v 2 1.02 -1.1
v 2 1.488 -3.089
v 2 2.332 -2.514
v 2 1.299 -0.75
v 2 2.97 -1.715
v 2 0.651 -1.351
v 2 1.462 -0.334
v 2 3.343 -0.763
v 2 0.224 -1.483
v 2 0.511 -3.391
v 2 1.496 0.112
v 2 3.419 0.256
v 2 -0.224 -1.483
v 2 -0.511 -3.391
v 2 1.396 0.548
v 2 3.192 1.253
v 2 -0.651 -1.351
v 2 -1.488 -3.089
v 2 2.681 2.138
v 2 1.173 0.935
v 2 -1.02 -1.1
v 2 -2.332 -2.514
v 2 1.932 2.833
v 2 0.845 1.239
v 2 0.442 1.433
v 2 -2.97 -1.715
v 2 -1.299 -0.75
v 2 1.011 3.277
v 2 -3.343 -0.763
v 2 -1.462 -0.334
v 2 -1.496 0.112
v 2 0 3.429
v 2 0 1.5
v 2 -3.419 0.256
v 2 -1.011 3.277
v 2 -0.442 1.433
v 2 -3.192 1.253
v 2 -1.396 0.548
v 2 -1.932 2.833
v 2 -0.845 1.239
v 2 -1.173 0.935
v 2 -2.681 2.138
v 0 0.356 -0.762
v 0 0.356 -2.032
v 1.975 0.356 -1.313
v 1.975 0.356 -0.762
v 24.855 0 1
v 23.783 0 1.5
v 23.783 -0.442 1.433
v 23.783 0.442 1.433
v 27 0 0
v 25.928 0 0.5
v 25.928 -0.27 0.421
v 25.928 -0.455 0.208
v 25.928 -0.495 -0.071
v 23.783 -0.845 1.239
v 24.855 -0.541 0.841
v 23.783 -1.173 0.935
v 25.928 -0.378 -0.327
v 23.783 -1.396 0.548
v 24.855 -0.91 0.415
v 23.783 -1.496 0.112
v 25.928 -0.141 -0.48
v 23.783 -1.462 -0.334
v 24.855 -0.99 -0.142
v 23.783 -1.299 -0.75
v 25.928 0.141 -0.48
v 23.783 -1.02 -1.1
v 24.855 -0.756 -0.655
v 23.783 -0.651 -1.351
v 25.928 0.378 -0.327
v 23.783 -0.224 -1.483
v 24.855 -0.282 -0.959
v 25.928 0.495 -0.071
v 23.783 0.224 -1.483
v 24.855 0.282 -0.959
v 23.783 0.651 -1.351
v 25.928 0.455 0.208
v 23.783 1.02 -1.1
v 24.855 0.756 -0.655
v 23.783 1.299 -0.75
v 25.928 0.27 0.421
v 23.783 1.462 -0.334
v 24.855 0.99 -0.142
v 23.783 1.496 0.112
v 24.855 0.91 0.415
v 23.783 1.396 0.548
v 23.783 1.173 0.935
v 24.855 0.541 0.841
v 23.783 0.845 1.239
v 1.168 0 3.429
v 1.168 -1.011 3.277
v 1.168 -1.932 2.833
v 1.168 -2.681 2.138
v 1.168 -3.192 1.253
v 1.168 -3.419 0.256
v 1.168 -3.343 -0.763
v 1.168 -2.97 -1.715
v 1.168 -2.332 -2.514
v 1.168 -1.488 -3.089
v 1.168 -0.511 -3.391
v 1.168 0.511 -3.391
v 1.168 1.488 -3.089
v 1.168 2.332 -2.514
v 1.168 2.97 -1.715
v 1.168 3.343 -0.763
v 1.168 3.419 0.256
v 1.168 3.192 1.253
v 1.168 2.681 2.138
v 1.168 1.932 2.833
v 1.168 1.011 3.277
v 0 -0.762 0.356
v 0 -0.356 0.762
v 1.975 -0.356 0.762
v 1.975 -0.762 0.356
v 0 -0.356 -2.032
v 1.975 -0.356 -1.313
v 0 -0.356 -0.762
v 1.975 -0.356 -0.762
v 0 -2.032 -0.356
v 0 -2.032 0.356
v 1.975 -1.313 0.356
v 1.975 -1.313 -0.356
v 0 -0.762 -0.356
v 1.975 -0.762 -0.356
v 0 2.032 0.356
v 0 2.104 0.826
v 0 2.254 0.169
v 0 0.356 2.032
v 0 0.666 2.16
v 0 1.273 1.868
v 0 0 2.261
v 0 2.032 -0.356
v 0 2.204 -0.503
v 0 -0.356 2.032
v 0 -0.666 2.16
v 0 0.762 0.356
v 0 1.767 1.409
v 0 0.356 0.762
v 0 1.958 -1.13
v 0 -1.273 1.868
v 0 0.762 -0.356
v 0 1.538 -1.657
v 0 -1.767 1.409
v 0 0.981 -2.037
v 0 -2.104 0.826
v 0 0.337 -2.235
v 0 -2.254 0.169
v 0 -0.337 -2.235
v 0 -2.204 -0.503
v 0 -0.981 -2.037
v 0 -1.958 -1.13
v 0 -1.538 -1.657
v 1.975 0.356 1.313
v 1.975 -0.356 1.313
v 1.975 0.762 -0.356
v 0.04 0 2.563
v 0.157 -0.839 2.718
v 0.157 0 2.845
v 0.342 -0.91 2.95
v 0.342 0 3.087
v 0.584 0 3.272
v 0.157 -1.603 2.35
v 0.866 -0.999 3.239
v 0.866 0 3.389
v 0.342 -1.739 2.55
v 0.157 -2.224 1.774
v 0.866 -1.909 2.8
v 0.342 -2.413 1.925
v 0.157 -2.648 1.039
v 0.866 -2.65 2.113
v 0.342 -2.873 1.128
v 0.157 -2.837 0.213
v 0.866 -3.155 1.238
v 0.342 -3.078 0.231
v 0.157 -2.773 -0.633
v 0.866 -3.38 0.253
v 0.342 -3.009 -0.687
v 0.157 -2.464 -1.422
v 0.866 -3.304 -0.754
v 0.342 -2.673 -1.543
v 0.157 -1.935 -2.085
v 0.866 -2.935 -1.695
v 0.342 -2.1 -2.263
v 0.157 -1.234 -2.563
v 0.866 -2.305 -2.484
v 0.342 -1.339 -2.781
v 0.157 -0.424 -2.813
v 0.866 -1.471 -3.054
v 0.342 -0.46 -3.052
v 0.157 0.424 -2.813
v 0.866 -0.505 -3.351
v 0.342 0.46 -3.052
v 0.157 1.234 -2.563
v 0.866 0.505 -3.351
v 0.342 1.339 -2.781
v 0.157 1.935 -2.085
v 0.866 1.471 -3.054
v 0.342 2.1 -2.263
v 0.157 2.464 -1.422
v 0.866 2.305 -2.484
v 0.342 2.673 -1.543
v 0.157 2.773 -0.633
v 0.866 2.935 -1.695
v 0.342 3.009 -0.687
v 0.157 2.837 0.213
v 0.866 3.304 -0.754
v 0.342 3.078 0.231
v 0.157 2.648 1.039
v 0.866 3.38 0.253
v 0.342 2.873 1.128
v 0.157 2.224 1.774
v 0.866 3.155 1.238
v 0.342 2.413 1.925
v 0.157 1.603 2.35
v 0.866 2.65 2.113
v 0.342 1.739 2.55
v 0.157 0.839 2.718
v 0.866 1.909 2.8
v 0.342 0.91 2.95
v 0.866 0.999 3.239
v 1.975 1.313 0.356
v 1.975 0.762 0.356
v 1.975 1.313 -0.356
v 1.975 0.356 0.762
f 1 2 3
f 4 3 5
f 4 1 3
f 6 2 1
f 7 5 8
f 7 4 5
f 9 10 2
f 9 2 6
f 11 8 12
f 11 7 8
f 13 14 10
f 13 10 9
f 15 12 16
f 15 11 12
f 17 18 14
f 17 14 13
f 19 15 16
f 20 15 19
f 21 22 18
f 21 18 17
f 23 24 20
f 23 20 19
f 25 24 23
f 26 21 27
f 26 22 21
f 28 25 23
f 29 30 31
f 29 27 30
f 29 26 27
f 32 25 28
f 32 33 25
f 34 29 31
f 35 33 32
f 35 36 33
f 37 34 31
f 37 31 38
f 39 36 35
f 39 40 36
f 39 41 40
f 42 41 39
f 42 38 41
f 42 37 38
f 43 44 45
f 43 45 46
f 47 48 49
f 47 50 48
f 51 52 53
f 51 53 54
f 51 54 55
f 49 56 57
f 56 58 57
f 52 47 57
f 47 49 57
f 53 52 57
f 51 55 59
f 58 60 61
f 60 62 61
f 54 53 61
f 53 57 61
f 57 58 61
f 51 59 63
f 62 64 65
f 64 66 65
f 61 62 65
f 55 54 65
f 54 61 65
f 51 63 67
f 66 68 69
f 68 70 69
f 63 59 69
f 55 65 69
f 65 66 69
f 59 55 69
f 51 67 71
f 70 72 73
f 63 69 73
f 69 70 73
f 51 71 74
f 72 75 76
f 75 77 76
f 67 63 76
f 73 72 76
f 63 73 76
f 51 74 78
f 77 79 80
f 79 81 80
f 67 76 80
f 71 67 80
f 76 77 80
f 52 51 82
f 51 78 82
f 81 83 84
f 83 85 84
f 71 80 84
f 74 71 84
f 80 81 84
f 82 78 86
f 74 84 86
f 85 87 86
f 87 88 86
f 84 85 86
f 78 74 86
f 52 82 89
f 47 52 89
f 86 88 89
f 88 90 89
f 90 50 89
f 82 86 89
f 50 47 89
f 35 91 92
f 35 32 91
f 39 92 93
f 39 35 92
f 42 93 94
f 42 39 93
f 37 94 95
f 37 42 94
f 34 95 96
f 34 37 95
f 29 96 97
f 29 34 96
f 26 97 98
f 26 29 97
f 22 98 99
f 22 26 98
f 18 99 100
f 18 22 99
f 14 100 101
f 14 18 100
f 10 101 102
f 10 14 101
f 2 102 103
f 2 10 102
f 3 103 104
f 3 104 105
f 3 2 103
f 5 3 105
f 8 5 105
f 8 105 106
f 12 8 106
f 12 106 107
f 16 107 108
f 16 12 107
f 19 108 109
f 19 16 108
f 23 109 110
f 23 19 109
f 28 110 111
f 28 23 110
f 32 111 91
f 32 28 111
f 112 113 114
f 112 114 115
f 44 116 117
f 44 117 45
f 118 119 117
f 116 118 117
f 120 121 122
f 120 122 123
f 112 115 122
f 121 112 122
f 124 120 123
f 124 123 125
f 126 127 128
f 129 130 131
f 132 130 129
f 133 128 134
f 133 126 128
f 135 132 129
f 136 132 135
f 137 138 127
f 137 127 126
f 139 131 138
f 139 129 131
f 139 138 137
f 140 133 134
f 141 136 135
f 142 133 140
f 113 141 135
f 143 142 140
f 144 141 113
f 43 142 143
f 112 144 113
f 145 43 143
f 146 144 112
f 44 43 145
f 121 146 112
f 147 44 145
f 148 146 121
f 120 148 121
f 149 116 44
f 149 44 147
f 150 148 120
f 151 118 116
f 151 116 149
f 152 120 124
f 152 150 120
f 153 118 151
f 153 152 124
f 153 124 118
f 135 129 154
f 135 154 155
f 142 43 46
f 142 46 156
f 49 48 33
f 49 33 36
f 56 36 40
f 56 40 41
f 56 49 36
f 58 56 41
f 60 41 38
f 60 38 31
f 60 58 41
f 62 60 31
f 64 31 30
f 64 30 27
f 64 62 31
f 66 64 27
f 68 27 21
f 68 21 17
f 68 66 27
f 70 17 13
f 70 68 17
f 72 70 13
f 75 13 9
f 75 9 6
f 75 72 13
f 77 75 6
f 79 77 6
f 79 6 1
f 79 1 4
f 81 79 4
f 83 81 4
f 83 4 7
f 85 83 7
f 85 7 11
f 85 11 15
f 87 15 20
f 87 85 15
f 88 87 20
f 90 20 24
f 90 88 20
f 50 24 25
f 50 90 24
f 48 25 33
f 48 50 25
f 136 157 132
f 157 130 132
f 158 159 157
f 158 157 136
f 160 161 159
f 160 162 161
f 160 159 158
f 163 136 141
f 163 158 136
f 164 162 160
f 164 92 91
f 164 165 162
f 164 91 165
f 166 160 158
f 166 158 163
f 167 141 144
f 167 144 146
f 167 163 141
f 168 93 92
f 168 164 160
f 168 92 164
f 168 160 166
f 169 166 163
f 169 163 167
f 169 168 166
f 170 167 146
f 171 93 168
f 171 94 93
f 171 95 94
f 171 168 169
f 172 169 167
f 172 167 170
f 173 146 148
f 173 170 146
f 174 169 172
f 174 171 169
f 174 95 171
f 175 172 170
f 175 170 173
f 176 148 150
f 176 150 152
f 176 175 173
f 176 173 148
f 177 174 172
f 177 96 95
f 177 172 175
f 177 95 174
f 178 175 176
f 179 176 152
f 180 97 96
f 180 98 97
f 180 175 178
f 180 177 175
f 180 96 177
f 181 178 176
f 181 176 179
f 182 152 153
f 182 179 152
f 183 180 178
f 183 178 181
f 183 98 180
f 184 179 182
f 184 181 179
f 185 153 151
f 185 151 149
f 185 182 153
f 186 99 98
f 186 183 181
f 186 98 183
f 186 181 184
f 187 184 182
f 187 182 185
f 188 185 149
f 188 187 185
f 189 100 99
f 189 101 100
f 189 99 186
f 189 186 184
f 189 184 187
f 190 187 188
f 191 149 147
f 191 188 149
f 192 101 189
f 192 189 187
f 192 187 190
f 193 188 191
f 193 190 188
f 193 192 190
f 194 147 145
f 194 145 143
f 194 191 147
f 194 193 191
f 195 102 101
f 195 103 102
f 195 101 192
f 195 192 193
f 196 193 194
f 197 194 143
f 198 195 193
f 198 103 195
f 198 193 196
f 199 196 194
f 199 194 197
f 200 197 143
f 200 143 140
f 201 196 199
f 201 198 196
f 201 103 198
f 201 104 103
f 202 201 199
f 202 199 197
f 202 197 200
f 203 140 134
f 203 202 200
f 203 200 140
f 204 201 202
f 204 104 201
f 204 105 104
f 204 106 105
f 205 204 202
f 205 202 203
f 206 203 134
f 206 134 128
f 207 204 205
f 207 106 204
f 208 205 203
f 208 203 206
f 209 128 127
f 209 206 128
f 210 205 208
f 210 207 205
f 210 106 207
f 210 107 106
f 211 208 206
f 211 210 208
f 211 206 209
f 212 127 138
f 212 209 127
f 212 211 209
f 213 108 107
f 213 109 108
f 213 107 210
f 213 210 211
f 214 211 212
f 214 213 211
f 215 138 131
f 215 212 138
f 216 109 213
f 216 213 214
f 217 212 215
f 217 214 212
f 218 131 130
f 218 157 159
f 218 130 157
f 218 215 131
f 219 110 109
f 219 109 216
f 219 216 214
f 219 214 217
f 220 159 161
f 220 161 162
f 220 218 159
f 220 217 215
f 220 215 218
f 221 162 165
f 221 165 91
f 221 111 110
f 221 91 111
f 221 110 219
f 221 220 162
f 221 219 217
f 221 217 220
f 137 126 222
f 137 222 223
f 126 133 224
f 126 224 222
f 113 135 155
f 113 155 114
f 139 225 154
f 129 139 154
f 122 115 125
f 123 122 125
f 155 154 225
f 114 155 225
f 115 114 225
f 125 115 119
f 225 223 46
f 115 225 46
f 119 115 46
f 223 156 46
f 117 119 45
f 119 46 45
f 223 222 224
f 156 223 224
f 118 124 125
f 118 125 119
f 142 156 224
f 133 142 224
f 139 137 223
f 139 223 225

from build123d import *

# Parameters (mm, degrees)
CUT_EXTRUDE3_DEPTH         = 1.9746
DRAFT1_ANGLE               = 20
RECESSI_CUT_EXTRUDE5_DEPTH = 1.9746


with BuildPart() as part:
    # Sketch1 → base-Revolve (revolve)
    with BuildSketch(Plane.XY, mode=Mode.PRIVATE) as base_revolve_sk:
        with BuildLine():
            Line((0, 0), (0, 2.2606))
            ThreePointArc((0, 2.2606), (0.342216437, 3.086783563), (1.1684, 3.429))
            Line((1.1684, 3.429), (2, 3.429))
            Line((2, 3.429), (2, 1.5))
            Line((2, 1.5), (27, 1.5))
            Line((27, 1.5), (27, 0))
            Line((27, 0), (0, 0))
        make_face()
    revolve(base_revolve_sk.sketch.rotate(Axis((0, 0, 0), (1, 0, 0)), 90), axis=Axis((0, 0, 0), (1, 0, 0)))

    # Sketch4 → Cut-Extrude3 (cut)
    with BuildSketch(Plane(origin=(0, 0, 0), x_dir=(0, 0, -1), z_dir=(1, 0, 0))):
        Polygon((0.3556, 2.032), (-0.3556, 2.032), (-0.3556, 0.3556), (-2.032, 0.3556), (-2.032, -0.3556), (-0.3556, -0.3556), (-0.3556, -2.032), (0.3556, -2.032), (0.3556, -0.3556), (2.032, -0.3556), (2.032, 0.3556), (0.3556, 0.3556), align=None)
    extrude(amount=CUT_EXTRUDE3_DEPTH, mode=Mode.SUBTRACT)

    # Draft1
    draft1_faces = [part.faces().sort_by_distance(p)[0] for p in [
        (0.9873, 0, -2.032),
        (0.9873, -2.032, 0),
        (0.9873, 0, 2.032),
        (0.9873, 2.032, 0),
    ]]
    draft(draft1_faces, Plane(origin=(0, 0, 0), x_dir=(0, 0, -1), z_dir=(-1, 0, 0)), DRAFT1_ANGLE)

    # Sketch5 → recessI_Cut-Extrude5 (cut)
    with BuildSketch(Plane.ZY):
        Polygon((0.3556, 0.762), (0.762, 0.3556), (0.3556, 0.3556), align=None)
        Polygon((-0.3556, 0.3556), (-0.762, 0.3556), (-0.3556, 0.762), align=None)
        Polygon((-0.3556, -0.762), (-0.762, -0.3556), (-0.3556, -0.3556), align=None)
        Polygon((0.3556, -0.3556), (0.762, -0.3556), (0.3556, -0.762), align=None)
    extrude(amount=-RECESSI_CUT_EXTRUDE5_DEPTH, mode=Mode.SUBTRACT)

    # Sketch14 → point_Cut-Revolve3 (revolve, cut)
    with BuildSketch(Plane.XY, mode=Mode.PRIVATE) as point_cut_revolve3_sk:
        Polygon((27, 0), (23.783239619, 1.5), (27.184454292, 1.5), (27.184454292, 0), align=None)
    revolve(point_cut_revolve3_sk.sketch.rotate(Axis((0, 0, 0), (1, 0, 0)), 90), axis=Axis((0, 0, 0), (1, 0, 0)), mode=Mode.SUBTRACT)


solid = part.part
